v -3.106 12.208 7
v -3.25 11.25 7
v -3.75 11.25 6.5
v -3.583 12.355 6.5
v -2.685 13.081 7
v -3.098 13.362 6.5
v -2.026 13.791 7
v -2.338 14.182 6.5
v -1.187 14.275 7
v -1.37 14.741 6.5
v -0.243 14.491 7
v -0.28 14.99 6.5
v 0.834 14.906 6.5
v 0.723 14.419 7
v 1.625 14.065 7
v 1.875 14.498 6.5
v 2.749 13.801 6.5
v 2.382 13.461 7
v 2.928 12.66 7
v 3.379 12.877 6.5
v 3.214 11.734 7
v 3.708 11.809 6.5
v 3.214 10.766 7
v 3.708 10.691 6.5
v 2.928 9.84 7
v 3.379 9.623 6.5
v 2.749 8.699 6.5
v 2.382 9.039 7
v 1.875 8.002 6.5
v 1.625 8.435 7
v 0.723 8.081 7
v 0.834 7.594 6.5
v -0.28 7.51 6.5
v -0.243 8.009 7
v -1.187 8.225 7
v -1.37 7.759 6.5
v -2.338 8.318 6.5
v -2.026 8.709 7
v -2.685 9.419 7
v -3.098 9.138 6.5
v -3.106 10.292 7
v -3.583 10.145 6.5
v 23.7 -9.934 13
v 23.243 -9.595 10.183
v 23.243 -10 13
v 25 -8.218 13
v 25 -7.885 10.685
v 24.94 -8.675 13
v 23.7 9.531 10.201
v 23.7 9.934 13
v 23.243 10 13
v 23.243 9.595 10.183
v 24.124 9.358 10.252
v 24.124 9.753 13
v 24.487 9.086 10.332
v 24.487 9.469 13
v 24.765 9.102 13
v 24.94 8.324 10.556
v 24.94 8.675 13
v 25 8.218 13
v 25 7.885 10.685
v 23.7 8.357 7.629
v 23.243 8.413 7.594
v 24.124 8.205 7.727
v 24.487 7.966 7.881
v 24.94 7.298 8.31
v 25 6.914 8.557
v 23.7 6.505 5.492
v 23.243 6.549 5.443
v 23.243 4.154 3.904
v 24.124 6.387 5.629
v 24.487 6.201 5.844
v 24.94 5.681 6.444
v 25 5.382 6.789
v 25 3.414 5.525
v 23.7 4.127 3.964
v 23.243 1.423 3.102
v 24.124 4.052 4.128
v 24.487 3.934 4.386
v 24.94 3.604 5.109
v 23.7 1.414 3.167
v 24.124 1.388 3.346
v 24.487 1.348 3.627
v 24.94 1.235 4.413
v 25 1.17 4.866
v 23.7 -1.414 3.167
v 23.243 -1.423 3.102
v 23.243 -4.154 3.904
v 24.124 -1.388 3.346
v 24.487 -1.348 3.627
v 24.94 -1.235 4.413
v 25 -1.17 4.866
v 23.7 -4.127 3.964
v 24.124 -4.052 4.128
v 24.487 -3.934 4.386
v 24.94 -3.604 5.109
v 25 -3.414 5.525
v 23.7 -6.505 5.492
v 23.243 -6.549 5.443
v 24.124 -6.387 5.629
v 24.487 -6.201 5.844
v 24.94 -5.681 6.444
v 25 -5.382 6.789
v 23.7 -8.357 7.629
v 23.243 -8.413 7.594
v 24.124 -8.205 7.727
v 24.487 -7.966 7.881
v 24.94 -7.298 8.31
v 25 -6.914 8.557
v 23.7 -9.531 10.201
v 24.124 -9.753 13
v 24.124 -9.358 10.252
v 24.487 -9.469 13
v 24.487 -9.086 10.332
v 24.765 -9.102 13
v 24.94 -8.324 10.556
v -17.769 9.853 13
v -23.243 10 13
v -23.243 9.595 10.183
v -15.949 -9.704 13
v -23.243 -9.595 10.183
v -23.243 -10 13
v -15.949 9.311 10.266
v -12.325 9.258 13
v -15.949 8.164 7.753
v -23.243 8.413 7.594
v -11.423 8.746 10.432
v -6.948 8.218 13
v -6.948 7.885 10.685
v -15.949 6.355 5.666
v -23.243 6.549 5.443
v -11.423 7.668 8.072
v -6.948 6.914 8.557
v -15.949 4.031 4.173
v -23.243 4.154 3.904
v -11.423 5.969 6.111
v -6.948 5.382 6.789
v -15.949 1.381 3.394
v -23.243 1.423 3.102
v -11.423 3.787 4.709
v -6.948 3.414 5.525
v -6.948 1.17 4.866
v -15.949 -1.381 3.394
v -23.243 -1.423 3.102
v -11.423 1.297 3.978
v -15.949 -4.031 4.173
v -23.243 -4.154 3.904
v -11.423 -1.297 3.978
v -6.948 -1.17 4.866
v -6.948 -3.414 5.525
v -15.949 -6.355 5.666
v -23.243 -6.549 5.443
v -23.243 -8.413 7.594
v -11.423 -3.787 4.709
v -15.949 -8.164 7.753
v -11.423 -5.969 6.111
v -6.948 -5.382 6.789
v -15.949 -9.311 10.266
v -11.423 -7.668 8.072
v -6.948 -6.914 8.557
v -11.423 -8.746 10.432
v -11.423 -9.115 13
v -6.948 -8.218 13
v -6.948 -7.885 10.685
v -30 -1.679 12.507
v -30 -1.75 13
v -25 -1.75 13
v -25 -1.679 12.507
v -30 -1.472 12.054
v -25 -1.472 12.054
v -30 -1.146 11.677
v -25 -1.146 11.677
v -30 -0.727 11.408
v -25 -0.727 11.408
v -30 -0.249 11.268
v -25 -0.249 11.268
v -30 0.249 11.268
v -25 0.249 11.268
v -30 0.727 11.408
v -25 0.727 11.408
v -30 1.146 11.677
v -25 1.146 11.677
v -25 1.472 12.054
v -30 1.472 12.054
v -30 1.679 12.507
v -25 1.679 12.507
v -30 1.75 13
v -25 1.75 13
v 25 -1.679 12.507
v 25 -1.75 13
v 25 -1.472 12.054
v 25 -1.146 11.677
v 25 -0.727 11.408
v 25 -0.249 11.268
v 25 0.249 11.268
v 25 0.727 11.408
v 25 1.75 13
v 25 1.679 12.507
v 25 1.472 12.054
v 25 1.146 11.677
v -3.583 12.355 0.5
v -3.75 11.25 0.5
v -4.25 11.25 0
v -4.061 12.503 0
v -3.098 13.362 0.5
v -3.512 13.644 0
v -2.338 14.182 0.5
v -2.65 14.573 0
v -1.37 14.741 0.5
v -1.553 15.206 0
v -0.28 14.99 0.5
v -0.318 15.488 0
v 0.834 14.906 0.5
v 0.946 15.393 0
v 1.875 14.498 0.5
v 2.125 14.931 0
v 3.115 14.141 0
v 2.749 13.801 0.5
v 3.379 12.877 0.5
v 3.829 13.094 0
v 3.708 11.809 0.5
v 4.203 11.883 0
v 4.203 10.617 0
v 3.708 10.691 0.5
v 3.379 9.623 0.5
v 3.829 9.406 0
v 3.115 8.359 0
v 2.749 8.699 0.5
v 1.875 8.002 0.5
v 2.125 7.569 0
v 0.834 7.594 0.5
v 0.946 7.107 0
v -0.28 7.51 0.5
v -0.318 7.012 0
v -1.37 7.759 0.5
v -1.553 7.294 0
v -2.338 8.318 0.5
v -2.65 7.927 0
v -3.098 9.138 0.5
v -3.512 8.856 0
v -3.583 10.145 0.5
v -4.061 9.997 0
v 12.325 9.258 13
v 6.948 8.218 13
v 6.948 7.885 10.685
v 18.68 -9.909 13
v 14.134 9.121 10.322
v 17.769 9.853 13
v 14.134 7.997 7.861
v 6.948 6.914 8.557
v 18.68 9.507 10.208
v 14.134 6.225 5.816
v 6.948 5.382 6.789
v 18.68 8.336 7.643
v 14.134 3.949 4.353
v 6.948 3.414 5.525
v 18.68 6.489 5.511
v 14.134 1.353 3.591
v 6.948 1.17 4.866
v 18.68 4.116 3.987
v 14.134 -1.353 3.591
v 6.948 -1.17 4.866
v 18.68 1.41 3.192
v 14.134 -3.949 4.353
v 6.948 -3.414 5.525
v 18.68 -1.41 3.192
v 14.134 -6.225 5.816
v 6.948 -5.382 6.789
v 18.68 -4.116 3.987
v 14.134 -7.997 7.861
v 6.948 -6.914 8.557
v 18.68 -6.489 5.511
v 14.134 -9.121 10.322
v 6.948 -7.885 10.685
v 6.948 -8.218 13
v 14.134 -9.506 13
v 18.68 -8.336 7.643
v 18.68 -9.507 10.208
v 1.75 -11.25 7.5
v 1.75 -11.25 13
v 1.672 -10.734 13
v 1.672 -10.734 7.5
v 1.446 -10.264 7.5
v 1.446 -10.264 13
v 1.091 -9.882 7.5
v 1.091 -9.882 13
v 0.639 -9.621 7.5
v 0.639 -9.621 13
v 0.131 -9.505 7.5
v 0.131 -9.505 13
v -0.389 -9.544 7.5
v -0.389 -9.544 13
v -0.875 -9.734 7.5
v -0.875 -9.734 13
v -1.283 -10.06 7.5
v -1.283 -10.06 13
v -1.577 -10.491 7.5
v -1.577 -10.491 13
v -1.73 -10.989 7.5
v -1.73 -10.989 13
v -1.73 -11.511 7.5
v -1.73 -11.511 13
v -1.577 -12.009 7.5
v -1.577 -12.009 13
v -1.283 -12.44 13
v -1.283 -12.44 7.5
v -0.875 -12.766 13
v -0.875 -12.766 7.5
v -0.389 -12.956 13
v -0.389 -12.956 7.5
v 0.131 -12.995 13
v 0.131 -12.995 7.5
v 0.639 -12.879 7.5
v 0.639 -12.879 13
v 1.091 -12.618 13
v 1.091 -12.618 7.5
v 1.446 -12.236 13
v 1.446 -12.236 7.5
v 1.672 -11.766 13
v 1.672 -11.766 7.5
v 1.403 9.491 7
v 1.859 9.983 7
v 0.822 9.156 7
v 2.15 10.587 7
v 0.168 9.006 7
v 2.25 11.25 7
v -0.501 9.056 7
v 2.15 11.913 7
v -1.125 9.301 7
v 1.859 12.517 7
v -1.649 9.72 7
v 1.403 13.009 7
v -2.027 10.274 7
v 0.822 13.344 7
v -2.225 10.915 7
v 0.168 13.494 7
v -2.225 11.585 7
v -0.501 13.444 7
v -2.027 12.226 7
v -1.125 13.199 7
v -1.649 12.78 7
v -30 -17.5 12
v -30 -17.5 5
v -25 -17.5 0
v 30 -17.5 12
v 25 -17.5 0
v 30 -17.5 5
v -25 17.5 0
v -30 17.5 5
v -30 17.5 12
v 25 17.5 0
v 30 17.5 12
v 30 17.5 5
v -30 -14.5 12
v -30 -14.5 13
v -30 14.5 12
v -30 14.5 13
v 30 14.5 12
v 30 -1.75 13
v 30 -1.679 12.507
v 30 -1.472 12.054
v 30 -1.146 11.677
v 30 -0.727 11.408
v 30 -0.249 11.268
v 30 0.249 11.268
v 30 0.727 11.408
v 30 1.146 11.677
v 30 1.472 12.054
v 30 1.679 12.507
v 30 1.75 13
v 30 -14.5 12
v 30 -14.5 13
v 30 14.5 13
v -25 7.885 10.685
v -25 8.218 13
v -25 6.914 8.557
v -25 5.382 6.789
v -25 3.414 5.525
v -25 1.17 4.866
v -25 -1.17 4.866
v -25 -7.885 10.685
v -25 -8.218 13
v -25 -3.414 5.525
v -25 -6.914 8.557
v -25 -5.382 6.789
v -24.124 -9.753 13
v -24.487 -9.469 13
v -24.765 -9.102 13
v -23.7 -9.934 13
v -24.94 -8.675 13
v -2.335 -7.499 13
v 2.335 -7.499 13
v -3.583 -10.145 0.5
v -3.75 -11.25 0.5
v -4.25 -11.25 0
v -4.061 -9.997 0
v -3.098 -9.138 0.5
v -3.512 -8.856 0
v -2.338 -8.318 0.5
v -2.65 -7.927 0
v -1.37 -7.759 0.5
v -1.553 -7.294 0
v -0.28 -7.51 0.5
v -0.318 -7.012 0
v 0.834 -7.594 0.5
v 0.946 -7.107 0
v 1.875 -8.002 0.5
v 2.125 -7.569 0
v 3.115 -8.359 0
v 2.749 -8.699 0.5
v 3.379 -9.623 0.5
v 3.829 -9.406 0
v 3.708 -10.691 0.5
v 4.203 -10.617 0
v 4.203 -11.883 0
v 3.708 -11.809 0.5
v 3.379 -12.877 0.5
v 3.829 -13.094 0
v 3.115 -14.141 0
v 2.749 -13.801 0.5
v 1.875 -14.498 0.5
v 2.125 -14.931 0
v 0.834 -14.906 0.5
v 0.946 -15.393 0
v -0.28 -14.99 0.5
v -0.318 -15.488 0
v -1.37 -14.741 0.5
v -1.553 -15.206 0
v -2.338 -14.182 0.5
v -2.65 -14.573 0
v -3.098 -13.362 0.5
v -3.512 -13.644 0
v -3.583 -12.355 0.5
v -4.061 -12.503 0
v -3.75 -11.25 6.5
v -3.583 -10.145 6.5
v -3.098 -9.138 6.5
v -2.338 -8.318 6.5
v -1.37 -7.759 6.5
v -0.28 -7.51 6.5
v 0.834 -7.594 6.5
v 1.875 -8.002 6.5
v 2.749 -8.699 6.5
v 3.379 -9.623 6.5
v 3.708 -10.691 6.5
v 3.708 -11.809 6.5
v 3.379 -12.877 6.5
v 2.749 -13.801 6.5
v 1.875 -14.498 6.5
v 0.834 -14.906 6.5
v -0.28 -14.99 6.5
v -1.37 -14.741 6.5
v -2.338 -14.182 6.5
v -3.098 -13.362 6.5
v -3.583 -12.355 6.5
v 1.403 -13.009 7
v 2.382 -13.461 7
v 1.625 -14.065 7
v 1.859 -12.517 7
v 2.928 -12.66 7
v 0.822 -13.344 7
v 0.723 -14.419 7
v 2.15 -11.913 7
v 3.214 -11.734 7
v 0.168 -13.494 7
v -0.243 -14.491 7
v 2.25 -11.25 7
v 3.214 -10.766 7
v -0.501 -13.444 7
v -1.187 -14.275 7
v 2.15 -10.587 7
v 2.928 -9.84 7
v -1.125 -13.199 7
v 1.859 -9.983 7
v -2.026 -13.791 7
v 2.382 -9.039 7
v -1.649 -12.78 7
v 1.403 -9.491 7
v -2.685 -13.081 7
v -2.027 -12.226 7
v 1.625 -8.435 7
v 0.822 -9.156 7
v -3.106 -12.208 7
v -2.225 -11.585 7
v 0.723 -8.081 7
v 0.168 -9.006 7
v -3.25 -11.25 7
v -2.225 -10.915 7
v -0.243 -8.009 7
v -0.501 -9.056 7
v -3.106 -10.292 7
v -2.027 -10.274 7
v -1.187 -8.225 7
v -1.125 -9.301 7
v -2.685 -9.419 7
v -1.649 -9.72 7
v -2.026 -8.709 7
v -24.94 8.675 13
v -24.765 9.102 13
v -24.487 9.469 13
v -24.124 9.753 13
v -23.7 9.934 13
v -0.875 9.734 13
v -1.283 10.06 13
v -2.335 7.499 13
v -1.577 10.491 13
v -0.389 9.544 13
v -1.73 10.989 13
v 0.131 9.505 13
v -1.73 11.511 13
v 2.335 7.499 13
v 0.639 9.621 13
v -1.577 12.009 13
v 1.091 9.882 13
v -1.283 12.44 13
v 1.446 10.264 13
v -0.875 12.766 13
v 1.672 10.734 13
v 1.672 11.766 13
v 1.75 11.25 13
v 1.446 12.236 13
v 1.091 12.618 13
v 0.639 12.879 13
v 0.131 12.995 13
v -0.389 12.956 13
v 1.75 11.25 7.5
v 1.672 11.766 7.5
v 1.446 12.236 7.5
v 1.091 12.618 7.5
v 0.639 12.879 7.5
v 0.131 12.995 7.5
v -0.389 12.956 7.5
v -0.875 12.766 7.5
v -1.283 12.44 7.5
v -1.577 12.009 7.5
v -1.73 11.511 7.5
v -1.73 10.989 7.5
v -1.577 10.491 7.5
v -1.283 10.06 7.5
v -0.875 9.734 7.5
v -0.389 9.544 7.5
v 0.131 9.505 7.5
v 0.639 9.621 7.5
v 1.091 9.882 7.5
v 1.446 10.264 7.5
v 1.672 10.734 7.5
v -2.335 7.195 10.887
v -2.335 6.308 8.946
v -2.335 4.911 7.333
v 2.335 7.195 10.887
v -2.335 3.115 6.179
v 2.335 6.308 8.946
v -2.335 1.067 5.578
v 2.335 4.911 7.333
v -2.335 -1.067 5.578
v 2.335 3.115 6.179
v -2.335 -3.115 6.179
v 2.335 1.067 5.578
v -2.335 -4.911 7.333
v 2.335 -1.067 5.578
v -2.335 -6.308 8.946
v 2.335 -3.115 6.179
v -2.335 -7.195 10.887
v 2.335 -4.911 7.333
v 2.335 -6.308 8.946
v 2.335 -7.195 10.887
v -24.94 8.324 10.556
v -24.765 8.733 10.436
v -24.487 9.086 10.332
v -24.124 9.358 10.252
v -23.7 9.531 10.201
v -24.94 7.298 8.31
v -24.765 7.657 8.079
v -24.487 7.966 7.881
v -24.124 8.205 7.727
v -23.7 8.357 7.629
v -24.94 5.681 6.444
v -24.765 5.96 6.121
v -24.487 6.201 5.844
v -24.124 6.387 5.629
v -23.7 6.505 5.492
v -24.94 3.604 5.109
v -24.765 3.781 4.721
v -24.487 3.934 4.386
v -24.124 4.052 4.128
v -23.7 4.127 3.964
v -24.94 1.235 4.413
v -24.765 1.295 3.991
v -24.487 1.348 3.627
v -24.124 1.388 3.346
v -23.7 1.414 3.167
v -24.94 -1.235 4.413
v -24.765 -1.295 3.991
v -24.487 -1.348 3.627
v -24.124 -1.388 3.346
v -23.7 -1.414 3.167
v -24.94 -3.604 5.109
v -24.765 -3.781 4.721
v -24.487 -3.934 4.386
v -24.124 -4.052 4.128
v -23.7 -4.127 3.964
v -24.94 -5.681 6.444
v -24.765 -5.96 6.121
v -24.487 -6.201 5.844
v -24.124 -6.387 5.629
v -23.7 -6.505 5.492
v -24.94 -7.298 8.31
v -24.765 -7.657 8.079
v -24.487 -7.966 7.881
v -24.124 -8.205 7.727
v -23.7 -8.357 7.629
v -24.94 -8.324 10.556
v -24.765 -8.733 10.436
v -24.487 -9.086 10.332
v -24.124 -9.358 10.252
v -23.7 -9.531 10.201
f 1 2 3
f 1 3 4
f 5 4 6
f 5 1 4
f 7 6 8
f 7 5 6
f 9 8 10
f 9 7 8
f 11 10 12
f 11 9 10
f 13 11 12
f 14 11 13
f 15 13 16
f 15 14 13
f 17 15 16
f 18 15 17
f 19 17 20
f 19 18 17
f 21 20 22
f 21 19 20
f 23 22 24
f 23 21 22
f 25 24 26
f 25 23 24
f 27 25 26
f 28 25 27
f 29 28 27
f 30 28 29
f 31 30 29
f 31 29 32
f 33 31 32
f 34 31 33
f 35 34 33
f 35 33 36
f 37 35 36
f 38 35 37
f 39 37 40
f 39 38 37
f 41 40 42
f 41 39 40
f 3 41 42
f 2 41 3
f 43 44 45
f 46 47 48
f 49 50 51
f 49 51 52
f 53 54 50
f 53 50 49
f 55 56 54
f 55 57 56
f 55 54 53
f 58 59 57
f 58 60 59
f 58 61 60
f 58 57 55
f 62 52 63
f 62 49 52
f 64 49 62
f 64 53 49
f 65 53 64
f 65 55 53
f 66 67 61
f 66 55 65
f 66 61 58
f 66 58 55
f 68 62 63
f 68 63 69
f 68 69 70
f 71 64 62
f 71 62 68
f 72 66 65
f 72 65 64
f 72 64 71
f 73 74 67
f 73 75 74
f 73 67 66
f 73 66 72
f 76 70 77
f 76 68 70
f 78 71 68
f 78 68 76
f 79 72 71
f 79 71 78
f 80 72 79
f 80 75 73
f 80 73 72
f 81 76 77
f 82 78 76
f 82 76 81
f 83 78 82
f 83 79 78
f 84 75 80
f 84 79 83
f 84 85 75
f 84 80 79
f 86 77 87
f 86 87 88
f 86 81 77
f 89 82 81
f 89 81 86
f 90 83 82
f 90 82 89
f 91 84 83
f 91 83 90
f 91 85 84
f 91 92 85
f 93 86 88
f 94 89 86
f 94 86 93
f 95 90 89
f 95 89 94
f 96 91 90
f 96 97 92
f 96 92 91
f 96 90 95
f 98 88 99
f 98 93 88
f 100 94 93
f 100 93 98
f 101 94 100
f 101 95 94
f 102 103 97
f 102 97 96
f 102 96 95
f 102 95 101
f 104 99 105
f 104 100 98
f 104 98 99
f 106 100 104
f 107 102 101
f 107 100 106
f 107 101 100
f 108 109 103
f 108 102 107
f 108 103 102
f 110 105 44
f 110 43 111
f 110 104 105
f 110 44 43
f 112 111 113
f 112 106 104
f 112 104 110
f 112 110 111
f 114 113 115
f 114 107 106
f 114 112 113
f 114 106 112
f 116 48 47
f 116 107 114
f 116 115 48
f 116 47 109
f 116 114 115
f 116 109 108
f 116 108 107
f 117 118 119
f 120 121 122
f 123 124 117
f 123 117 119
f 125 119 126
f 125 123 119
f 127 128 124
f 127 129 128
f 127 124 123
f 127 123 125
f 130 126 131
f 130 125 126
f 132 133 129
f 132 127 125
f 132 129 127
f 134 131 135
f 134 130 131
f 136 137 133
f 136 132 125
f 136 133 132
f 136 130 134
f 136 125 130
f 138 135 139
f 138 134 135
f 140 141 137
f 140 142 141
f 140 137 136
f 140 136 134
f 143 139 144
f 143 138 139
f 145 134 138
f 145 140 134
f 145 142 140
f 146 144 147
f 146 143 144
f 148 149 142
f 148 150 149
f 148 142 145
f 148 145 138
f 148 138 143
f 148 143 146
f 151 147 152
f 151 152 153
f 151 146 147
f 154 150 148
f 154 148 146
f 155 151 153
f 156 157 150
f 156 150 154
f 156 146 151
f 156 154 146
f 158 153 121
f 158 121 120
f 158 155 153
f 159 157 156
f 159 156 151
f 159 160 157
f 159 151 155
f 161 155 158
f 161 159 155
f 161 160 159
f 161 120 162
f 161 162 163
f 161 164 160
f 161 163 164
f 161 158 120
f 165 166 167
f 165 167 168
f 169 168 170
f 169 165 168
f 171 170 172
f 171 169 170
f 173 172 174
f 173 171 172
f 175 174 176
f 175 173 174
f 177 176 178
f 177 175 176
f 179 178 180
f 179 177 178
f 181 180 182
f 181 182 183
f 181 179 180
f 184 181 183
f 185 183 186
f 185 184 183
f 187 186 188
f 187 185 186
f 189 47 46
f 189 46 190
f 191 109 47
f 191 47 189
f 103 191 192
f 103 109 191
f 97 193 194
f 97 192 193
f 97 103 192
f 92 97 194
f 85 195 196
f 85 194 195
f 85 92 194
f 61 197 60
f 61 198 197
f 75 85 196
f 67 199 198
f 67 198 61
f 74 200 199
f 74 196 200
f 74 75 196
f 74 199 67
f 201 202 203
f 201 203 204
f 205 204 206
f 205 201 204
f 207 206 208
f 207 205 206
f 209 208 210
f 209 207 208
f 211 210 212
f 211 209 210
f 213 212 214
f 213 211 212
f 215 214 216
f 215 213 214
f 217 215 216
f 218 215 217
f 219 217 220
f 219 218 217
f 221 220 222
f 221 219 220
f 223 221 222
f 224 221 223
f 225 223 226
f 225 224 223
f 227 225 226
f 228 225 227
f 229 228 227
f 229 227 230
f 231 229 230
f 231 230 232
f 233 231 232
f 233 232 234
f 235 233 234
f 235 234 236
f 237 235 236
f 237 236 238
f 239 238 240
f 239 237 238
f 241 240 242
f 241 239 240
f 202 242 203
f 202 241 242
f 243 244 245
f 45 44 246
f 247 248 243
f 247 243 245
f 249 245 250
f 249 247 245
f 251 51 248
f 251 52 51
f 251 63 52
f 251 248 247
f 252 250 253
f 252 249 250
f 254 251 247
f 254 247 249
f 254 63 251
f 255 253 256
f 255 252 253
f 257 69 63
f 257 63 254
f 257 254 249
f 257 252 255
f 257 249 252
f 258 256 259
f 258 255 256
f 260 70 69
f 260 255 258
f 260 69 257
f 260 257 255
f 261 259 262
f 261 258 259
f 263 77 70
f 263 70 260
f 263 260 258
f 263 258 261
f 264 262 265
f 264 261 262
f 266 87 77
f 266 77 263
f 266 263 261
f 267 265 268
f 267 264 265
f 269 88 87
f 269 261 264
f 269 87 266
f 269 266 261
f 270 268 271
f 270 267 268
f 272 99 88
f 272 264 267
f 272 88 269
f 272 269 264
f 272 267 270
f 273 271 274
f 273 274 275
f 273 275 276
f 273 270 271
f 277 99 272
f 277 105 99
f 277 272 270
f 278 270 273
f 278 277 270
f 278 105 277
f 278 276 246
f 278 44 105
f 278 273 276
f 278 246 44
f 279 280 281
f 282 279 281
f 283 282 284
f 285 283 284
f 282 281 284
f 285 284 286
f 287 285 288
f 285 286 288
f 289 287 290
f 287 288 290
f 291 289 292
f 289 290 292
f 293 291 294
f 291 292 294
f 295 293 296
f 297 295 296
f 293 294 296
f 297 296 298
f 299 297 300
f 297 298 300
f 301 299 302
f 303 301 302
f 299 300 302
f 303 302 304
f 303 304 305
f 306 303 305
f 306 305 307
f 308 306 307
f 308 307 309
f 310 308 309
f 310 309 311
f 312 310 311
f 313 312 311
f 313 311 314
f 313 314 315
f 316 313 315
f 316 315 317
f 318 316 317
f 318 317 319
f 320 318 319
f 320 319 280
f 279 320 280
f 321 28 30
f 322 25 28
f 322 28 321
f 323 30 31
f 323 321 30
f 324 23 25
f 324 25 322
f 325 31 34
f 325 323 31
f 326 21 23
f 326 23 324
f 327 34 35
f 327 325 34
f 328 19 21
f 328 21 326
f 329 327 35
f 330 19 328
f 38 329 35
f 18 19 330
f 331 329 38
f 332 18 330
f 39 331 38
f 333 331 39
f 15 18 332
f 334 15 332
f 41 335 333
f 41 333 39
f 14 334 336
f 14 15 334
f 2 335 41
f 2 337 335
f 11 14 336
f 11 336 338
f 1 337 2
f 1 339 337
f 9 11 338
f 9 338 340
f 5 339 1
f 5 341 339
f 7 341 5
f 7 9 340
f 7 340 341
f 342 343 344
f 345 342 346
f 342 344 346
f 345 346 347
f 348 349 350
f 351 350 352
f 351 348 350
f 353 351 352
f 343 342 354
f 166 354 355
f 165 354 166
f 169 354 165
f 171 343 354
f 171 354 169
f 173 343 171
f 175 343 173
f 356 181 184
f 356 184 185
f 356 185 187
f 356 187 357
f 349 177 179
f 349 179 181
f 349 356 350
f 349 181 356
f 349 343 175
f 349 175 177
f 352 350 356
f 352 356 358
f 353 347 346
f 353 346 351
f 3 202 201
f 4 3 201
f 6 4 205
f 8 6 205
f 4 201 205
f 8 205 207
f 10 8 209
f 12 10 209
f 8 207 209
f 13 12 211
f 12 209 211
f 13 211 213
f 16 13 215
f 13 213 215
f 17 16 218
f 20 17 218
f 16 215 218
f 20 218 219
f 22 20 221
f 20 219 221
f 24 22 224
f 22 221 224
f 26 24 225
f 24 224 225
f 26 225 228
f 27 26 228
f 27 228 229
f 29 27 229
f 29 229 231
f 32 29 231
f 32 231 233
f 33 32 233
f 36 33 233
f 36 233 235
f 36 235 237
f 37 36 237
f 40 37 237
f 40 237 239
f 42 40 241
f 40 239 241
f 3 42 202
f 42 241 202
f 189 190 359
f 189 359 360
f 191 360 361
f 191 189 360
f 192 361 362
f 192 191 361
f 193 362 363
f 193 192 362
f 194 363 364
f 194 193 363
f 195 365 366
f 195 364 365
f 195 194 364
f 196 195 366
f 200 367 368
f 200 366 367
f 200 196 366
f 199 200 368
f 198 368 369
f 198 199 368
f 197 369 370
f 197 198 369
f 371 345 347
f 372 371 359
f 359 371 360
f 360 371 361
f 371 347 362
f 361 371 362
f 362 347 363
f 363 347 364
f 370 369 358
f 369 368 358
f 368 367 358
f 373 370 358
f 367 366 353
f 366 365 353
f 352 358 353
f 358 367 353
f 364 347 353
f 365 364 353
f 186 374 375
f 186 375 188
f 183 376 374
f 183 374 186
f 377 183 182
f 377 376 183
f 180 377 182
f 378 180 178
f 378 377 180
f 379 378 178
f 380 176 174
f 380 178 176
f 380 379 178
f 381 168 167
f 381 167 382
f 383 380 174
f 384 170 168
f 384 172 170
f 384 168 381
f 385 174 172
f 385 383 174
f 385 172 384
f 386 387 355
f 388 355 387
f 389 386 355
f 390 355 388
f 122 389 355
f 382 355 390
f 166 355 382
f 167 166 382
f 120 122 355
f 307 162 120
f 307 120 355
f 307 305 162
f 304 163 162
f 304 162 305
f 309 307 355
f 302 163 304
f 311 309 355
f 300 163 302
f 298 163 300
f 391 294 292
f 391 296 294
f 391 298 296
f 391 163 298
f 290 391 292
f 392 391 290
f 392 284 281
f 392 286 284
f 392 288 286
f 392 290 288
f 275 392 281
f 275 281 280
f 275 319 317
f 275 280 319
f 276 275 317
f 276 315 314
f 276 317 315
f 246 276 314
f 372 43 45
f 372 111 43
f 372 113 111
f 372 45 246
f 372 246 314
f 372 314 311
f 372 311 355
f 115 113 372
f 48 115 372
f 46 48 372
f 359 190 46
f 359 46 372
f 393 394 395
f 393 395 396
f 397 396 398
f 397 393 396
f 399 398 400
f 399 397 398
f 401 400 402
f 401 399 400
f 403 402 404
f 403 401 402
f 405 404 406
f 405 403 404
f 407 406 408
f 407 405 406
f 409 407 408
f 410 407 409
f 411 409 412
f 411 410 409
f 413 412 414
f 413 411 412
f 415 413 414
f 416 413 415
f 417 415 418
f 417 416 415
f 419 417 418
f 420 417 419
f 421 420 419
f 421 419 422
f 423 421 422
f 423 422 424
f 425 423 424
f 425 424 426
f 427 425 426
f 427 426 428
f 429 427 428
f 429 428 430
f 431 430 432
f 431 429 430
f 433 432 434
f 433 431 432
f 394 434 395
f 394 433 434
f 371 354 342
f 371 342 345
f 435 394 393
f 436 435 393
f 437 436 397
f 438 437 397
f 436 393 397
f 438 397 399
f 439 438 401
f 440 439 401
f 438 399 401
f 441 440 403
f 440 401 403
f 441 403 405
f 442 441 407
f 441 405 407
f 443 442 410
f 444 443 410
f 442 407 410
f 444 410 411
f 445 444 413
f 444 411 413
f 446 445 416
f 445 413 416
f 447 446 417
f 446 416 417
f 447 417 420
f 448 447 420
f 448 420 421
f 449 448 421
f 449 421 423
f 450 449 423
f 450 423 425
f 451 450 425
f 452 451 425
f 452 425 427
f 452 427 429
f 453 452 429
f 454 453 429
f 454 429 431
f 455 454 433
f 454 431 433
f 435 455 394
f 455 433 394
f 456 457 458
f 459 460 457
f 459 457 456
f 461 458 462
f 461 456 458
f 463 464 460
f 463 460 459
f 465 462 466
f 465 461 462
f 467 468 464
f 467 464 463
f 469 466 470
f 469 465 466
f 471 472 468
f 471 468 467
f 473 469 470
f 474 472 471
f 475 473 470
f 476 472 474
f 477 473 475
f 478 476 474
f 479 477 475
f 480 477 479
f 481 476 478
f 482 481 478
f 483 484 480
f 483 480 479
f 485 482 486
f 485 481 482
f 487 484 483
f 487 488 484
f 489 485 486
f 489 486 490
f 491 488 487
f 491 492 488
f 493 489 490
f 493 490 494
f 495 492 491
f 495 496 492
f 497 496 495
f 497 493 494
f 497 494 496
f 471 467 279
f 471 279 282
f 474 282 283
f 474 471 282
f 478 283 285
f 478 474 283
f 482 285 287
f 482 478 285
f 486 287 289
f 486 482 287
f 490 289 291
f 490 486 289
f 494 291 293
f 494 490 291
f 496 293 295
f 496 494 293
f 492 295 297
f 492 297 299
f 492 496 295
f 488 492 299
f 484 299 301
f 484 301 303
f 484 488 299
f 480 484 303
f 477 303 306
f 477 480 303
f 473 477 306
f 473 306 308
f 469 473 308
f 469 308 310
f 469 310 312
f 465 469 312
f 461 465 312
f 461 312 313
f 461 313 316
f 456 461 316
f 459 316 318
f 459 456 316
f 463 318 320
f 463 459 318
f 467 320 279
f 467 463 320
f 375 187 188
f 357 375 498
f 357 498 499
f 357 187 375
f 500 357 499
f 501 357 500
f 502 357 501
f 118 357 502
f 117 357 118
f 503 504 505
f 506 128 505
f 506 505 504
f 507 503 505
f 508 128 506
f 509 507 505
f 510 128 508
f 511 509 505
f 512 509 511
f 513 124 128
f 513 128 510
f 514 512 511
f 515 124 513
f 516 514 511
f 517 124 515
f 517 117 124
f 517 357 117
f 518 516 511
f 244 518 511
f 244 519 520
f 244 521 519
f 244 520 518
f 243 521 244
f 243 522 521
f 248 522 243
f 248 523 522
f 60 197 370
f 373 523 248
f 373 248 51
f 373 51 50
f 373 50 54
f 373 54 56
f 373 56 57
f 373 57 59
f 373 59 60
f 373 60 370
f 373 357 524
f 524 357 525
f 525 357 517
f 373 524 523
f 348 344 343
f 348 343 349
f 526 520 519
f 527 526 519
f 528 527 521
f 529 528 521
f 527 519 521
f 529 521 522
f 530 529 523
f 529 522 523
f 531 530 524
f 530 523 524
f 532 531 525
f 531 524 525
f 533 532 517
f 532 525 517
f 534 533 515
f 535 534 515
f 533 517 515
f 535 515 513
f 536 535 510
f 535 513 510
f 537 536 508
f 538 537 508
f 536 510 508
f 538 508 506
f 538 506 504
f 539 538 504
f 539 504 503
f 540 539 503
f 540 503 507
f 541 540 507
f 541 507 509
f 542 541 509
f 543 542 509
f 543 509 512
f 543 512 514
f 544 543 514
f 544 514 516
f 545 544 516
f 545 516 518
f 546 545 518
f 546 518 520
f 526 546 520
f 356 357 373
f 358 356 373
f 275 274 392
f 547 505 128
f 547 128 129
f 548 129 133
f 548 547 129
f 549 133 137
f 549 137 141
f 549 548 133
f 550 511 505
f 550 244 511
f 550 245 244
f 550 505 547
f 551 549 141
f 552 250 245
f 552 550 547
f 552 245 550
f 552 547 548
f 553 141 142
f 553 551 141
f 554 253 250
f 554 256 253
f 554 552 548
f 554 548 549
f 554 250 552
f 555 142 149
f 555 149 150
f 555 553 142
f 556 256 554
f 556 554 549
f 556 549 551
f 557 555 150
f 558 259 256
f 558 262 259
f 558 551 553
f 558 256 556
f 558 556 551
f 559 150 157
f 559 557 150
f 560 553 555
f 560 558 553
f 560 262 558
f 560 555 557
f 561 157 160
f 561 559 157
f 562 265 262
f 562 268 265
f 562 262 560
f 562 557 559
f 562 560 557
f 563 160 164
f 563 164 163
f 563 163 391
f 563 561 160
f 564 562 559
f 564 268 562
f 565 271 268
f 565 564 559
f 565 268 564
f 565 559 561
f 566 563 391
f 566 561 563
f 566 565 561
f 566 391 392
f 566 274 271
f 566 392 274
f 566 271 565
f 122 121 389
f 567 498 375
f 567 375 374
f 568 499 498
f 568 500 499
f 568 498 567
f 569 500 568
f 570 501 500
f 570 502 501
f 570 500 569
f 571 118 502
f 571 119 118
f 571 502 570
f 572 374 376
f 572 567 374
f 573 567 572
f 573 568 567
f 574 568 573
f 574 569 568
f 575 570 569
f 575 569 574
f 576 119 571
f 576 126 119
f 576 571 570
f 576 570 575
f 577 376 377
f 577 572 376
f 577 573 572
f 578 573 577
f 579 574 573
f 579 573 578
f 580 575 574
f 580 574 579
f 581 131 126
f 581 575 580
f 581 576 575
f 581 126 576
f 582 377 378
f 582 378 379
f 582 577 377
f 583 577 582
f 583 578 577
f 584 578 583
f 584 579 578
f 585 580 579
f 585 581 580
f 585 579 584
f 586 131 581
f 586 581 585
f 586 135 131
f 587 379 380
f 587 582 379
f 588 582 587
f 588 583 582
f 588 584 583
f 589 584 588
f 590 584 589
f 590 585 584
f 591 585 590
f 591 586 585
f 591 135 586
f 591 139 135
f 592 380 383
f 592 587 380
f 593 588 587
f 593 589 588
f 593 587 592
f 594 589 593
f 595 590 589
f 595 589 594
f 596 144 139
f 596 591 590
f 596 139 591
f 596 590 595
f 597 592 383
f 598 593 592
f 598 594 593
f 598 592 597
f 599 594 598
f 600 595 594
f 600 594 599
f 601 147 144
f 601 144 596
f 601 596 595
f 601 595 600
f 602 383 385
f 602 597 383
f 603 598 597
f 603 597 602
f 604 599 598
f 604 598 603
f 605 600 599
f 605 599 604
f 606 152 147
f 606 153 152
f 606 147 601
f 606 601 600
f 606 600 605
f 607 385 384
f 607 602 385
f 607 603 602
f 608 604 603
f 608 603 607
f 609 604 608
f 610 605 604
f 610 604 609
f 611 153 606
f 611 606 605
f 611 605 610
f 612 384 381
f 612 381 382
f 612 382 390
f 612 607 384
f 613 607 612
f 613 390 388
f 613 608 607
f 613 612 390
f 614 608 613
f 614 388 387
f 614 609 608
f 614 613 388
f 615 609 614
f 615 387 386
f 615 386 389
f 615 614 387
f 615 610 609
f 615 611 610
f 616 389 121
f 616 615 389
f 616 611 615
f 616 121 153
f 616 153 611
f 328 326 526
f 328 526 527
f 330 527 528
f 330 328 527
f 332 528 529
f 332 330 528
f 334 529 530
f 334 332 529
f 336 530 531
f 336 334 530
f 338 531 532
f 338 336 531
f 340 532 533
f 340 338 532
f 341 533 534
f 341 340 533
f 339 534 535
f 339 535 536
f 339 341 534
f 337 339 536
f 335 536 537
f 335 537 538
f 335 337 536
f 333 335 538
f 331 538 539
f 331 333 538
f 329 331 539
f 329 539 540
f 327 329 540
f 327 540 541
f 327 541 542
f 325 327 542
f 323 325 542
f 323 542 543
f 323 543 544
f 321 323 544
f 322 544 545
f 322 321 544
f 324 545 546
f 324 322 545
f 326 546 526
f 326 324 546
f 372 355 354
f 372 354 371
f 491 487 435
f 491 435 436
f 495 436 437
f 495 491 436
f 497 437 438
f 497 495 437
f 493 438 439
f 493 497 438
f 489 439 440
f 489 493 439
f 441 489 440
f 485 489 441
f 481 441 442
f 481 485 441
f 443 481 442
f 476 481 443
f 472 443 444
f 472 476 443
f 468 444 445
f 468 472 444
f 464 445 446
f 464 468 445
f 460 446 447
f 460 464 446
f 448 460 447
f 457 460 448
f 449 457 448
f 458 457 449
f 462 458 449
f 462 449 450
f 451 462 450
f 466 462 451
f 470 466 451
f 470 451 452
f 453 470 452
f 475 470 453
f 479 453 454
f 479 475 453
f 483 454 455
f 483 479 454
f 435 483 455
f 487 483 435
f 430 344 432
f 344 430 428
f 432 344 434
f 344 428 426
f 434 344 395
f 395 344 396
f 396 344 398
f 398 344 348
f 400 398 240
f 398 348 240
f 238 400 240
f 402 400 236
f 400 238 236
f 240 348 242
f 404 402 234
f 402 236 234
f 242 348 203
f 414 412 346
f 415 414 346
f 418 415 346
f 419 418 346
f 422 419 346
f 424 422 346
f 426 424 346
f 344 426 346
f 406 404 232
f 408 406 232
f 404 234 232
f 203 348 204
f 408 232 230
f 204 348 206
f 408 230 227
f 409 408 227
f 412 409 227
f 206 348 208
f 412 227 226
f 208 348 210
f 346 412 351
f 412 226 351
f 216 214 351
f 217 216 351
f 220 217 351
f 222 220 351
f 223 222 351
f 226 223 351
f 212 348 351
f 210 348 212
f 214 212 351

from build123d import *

# Parameters (mm, degrees)
SKETCH1_W               = 60
SKETCH1_H               = 35
BOSS_EXTRUDE1_DEPTH     = 13
CUT_EXTRUDE1_DEPTH      = 64.837684937
CUT_EXTRUDE1_DEPTH_BACK = 64.837684937
SKETCH3_R               = 1.75
SKETCH4_W               = 60
SKETCH4_H               = 3
CUT_EXTRUDE2_DEPTH      = 1
SKETCH5_R               = 1.75
CUT_EXTRUDE3_DEPTH      = 38.084363362
CHAMFER1_SIZE           = 5
SKETCH6_R               = 3.75
CUT_EXTRUDE4_DEPTH      = 7
CHAMFER2_SIZE           = 0.5


with BuildPart() as part:
    # Sketch1 → Boss-Extrude1 (new body)
    with BuildSketch(Plane.XY):
        Rectangle(SKETCH1_W, SKETCH1_H)
    extrude(amount=BOSS_EXTRUDE1_DEPTH)

    # Sketch2 → Cut-Revolve1 (revolve, cut)
    with BuildSketch(Plane.XY.offset(13)):
        with BuildLine():
            Line((-25, 0), (-25, 8.218127455))
            ThreePointArc((-25, 8.218127455), (-24.486963528, 9.469250598), (-23.243251097, 10))
            ThreePointArc((-23.243251097, 10), (-15.040879193, 9.611248064), (-6.94833646, 8.218127455))
            ThreePointArc((-6.94833646, 8.218127455), (0, 7.408356031), (6.94833646, 8.218127455))
            ThreePointArc((6.94833646, 8.218127455), (15.040879193, 9.611248064), (23.243251097, 10))
            ThreePointArc((23.243251097, 10), (24.486963528, 9.469250598), (25, 8.218127455))
            Line((25, 8.218127455), (25, 0))
            Line((25, 0), (-25, 0))
        make_face()
    revolve(axis=Axis((25, 0, 13), (-1, 0, 0)), mode=Mode.SUBTRACT)

    # Sketch3 → Cut-Extrude1 (cut, two sides: drawn at the far end of the back side and taken through both)
    with BuildSketch(Plane(origin=(30, 0, 0), x_dir=(0, 0, -1), z_dir=(1, 0, 0)).offset(-CUT_EXTRUDE1_DEPTH_BACK)):
        with Locations((-13, 0)):
            Circle(SKETCH3_R)
    extrude(amount=CUT_EXTRUDE1_DEPTH + CUT_EXTRUDE1_DEPTH_BACK, mode=Mode.SUBTRACT)

    # Sketch4 → Cut-Extrude2 (cut)
    with BuildSketch(Plane.XY.offset(13)):
        with Locations((0, 16)):
            Rectangle(SKETCH4_W, SKETCH4_H)
        with Locations((0, -16)):
            Rectangle(SKETCH4_W, SKETCH4_H)
    extrude(amount=-CUT_EXTRUDE2_DEPTH, mode=Mode.SUBTRACT)

    # Sketch5 → Cut-Extrude3 (cut, through all)
    with BuildSketch(Plane.XY.offset(13)):
        with Locations((0, 11.25)):
            Circle(SKETCH5_R)
        with Locations((0, -11.25)):
            Circle(SKETCH5_R)
    extrude(amount=-CUT_EXTRUDE3_DEPTH, mode=Mode.SUBTRACT)

    # Chamfer1
    chamfer1_edges = [part.edges().sort_by_distance(p)[0] for p in [
        (-30, 0, 0),
        (30, 0, 0),
    ]]
    chamfer(chamfer1_edges, length=CHAMFER1_SIZE)

    # Sketch6 → Cut-Extrude4 (cut)
    with BuildSketch(Plane(origin=(0, 0, 0), x_dir=(-1, 0, 0), z_dir=(0, 0, -1))):
        with Locations((0, 11.25)):
            Circle(SKETCH6_R)
        with Locations((0, -11.25)):
            Circle(SKETCH6_R)
    extrude(amount=-CUT_EXTRUDE4_DEPTH, mode=Mode.SUBTRACT)

    # Chamfer2
    chamfer2_edges = [part.edges().sort_by_distance(p)[0] for p in [
        (3.75, -11.25, 0),
        (3.75, -11.25, 7),
        (-1.75, -11.25, 7),
        (3.75, 11.25, 0),
        (3.75, 11.25, 7),
        (-1.75, 11.25, 7),
    ]]
    chamfer(chamfer2_edges, length=CHAMFER2_SIZE)


solid = part.part
